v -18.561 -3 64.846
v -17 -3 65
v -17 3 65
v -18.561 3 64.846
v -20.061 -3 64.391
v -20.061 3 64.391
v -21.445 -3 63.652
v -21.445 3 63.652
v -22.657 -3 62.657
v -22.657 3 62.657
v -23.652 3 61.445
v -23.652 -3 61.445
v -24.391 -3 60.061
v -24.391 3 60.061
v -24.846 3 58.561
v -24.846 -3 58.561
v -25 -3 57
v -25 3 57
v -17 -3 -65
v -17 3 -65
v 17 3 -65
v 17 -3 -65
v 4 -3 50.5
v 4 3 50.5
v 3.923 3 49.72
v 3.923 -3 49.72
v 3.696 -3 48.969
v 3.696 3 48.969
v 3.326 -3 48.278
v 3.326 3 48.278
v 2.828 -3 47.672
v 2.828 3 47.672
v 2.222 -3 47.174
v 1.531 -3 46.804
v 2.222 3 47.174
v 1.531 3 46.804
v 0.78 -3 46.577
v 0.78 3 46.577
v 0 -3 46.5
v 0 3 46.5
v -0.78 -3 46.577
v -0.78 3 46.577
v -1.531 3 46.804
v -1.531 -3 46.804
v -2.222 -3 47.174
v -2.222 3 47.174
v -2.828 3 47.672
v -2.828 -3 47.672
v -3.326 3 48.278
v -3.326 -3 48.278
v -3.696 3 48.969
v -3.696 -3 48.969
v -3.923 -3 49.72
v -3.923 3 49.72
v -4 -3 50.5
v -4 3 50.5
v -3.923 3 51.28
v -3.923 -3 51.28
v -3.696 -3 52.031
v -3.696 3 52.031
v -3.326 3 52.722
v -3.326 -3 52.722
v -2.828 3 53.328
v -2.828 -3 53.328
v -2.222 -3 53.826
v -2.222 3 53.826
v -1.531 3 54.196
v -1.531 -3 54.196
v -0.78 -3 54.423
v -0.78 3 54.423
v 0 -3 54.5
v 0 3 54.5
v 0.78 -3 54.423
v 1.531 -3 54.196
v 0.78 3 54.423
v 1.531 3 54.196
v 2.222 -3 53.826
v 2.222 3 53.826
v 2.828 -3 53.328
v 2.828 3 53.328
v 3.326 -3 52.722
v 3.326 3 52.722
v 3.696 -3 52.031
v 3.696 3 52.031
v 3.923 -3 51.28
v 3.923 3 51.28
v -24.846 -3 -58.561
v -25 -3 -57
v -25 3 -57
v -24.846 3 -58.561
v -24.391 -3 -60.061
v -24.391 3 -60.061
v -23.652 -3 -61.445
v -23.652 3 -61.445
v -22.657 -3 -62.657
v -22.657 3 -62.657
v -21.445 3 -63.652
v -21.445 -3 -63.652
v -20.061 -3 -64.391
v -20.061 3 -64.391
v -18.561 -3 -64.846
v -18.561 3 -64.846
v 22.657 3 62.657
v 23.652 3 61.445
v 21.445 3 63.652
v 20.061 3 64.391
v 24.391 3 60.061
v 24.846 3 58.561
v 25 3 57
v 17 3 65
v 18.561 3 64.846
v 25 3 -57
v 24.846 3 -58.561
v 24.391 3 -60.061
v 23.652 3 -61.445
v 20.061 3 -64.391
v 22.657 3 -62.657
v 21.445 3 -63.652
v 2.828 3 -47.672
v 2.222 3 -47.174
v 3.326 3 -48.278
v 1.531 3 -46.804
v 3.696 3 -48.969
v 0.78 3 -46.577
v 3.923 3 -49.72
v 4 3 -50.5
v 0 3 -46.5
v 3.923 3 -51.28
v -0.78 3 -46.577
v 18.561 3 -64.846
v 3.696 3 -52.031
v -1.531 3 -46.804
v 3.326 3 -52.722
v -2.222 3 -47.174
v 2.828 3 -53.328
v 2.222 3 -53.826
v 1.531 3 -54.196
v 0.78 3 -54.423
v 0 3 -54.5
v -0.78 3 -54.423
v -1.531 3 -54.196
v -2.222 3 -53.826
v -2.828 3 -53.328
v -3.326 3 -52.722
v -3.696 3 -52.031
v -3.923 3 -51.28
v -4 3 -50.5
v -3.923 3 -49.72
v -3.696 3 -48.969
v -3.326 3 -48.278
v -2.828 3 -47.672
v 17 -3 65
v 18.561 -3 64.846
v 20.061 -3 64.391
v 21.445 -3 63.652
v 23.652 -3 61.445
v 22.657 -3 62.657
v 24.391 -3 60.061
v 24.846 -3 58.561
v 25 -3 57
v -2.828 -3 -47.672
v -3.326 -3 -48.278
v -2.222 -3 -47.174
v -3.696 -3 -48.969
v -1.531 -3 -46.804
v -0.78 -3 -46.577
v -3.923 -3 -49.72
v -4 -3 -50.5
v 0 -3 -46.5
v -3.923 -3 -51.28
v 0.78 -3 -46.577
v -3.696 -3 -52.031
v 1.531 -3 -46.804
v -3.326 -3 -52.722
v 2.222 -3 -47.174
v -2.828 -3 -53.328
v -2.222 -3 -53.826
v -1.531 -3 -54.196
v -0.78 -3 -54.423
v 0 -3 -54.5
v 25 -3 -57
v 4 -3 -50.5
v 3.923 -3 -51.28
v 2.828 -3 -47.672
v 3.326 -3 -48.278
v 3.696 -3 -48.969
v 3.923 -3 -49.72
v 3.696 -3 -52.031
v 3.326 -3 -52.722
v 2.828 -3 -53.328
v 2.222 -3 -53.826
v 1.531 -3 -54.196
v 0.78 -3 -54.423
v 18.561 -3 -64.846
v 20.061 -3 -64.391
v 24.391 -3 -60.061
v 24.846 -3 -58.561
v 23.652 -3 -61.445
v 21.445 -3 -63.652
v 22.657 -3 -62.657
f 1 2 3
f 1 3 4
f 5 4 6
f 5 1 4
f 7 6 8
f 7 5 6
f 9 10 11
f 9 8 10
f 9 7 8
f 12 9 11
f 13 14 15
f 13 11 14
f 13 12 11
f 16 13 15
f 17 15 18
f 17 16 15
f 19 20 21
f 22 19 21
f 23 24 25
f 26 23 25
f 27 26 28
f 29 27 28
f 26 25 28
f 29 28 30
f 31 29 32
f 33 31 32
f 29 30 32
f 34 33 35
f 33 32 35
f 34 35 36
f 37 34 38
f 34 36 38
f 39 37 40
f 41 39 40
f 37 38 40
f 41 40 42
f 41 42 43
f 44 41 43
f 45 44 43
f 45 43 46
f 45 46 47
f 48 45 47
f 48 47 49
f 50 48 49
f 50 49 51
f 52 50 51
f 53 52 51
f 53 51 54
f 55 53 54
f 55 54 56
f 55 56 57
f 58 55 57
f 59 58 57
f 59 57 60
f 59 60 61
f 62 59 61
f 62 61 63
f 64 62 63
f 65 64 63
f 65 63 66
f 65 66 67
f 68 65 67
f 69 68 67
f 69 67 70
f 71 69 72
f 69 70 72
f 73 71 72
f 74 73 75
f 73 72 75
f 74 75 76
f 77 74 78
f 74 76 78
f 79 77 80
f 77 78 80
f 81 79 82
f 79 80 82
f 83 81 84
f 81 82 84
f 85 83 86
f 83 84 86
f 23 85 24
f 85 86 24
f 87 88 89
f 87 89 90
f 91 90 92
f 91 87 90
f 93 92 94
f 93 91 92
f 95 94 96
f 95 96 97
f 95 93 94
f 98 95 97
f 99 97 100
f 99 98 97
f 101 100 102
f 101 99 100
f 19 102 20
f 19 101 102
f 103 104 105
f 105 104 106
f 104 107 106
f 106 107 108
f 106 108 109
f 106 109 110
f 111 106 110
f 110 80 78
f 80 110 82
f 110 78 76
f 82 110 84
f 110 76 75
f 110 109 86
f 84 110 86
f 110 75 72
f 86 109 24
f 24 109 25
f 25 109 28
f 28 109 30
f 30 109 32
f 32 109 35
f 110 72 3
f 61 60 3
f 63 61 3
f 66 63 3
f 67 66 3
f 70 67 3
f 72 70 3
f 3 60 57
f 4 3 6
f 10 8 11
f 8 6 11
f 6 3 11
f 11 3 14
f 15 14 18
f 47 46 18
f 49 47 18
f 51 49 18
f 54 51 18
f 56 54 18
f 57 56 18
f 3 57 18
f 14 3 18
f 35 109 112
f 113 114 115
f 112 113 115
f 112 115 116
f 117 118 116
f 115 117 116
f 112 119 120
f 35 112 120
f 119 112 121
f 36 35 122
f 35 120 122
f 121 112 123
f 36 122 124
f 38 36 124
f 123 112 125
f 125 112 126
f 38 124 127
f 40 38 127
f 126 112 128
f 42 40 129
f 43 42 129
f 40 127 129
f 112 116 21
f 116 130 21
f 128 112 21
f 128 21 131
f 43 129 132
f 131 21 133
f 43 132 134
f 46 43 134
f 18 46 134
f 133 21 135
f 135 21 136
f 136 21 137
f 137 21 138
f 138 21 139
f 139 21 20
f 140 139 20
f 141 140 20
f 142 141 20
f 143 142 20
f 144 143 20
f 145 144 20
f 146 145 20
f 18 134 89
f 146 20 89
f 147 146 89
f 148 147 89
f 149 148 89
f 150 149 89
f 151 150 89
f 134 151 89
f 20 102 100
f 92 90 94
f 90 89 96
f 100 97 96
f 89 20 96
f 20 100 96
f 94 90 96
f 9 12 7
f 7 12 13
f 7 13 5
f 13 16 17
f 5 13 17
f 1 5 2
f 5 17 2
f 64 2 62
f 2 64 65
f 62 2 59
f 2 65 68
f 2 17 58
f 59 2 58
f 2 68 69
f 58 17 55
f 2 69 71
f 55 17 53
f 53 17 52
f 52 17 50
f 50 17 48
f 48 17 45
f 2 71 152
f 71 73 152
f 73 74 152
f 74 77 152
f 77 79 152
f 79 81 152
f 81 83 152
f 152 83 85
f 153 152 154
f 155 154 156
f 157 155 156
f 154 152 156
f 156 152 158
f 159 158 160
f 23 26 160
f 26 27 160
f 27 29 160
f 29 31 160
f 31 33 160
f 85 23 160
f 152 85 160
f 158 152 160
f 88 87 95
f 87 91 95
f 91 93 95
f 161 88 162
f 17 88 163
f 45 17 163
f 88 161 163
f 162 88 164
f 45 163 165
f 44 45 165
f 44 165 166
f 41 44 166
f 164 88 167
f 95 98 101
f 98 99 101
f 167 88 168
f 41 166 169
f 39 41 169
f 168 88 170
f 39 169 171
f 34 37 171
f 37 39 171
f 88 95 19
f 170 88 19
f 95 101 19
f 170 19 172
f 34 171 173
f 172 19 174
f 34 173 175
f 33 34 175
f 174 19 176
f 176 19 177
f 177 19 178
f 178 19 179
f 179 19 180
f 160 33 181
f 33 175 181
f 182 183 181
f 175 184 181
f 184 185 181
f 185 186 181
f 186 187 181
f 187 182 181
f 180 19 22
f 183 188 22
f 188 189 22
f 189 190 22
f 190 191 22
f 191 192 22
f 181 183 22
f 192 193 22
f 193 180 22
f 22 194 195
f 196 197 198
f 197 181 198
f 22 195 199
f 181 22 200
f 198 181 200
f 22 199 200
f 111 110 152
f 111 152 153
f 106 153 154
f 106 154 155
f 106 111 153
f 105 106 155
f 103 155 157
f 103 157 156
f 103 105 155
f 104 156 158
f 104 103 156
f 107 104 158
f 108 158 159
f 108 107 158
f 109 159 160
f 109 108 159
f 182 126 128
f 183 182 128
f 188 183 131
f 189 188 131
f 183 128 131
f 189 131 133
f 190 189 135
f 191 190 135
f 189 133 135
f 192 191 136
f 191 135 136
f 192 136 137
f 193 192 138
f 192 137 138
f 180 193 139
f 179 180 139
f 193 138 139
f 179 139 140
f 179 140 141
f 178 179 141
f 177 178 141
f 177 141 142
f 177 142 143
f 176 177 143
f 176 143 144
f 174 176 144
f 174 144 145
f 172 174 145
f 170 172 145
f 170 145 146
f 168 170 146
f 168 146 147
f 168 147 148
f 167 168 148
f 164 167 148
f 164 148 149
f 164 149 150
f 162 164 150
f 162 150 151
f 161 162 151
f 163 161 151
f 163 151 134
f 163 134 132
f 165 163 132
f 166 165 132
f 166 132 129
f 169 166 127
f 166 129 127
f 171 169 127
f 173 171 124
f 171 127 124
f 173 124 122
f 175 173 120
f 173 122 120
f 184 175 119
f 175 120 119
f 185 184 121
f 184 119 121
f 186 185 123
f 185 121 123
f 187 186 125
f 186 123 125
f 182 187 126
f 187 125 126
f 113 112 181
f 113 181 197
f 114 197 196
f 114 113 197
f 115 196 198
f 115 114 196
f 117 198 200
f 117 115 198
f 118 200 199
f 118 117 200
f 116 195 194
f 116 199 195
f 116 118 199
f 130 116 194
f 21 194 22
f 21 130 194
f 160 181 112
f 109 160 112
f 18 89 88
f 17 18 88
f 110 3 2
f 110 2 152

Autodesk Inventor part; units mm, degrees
ref_plane "YZ Plane" through (0, 0, 0) normal (1, 0, 0) x (0, 1, 0)
ref_plane "XZ Plane" through (0, 0, 0) normal (0, 1, 0) x (-1, 0, 0)
ref_plane "XY Plane" through (0, 0, 0) normal (0, 0, 1) x (1, 0, 0)
sketch "Boceto3" plane through (0, 0, 0) normal (0, 0, 1) x (1, 0, 0)
  line L0 (25, -3) -> (25, 3)
  line L1 (25, 3) -> (-25, 3)
  line L2 (-25, 3) -> (-25, -3)
  line L3 (-25, -3) -> (25, -3)
  line L4 (25, -3) -> (-25, 3) construction
  line L5 (25, 3) -> (-25, -3) construction
  point P0 (0, 0)
  dimension "d15" = 6
  dimension "d16" = 50
extrude "Extrusión3" add sketch "Boceto3" along normal mid plane 130
sketch "Boceto4" plane through (-25, 3, 65) normal (0, 1, 0) x (1, 0, 0)
  line L0 (40, 102.5) -> (40, 27.5)
  line L1 (40, 27.5) -> (10, 27.5)
  line L2 (10, 27.5) -> (10, 102.5)
  line L3 (10, 102.5) -> (40, 102.5)
  line L4 (40, 102.5) -> (10, 27.5) construction
  line L5 (40, 27.5) -> (10, 102.5) construction
  circle A0 centre (25, 14.5) radius 4
  circle A1 centre (25, 14.5) radius 13
  line L6 (19.6627, 65) -> (30.4742, 65)
  circle A2 centre (25, 115.5) radius 4
  circle A3 centre (25, 115.5) radius 13
  point P0 (25, 65)
  point P1 (25, 65)
  dimension "d19" = 75
  dimension "d20" = 8
  dimension "d21" = 26
extrude "Extrusión4" cut sketch "Boceto4" against normal through all contours A0 | A2
fillet "Empalme2" radius 8 4 edges at (25, 0, 65) (-25, 0, 65) (-25, 0, -65) (25, 0, -65)
properties part number "SIDE BEARING GUIDE" material "Acero"
